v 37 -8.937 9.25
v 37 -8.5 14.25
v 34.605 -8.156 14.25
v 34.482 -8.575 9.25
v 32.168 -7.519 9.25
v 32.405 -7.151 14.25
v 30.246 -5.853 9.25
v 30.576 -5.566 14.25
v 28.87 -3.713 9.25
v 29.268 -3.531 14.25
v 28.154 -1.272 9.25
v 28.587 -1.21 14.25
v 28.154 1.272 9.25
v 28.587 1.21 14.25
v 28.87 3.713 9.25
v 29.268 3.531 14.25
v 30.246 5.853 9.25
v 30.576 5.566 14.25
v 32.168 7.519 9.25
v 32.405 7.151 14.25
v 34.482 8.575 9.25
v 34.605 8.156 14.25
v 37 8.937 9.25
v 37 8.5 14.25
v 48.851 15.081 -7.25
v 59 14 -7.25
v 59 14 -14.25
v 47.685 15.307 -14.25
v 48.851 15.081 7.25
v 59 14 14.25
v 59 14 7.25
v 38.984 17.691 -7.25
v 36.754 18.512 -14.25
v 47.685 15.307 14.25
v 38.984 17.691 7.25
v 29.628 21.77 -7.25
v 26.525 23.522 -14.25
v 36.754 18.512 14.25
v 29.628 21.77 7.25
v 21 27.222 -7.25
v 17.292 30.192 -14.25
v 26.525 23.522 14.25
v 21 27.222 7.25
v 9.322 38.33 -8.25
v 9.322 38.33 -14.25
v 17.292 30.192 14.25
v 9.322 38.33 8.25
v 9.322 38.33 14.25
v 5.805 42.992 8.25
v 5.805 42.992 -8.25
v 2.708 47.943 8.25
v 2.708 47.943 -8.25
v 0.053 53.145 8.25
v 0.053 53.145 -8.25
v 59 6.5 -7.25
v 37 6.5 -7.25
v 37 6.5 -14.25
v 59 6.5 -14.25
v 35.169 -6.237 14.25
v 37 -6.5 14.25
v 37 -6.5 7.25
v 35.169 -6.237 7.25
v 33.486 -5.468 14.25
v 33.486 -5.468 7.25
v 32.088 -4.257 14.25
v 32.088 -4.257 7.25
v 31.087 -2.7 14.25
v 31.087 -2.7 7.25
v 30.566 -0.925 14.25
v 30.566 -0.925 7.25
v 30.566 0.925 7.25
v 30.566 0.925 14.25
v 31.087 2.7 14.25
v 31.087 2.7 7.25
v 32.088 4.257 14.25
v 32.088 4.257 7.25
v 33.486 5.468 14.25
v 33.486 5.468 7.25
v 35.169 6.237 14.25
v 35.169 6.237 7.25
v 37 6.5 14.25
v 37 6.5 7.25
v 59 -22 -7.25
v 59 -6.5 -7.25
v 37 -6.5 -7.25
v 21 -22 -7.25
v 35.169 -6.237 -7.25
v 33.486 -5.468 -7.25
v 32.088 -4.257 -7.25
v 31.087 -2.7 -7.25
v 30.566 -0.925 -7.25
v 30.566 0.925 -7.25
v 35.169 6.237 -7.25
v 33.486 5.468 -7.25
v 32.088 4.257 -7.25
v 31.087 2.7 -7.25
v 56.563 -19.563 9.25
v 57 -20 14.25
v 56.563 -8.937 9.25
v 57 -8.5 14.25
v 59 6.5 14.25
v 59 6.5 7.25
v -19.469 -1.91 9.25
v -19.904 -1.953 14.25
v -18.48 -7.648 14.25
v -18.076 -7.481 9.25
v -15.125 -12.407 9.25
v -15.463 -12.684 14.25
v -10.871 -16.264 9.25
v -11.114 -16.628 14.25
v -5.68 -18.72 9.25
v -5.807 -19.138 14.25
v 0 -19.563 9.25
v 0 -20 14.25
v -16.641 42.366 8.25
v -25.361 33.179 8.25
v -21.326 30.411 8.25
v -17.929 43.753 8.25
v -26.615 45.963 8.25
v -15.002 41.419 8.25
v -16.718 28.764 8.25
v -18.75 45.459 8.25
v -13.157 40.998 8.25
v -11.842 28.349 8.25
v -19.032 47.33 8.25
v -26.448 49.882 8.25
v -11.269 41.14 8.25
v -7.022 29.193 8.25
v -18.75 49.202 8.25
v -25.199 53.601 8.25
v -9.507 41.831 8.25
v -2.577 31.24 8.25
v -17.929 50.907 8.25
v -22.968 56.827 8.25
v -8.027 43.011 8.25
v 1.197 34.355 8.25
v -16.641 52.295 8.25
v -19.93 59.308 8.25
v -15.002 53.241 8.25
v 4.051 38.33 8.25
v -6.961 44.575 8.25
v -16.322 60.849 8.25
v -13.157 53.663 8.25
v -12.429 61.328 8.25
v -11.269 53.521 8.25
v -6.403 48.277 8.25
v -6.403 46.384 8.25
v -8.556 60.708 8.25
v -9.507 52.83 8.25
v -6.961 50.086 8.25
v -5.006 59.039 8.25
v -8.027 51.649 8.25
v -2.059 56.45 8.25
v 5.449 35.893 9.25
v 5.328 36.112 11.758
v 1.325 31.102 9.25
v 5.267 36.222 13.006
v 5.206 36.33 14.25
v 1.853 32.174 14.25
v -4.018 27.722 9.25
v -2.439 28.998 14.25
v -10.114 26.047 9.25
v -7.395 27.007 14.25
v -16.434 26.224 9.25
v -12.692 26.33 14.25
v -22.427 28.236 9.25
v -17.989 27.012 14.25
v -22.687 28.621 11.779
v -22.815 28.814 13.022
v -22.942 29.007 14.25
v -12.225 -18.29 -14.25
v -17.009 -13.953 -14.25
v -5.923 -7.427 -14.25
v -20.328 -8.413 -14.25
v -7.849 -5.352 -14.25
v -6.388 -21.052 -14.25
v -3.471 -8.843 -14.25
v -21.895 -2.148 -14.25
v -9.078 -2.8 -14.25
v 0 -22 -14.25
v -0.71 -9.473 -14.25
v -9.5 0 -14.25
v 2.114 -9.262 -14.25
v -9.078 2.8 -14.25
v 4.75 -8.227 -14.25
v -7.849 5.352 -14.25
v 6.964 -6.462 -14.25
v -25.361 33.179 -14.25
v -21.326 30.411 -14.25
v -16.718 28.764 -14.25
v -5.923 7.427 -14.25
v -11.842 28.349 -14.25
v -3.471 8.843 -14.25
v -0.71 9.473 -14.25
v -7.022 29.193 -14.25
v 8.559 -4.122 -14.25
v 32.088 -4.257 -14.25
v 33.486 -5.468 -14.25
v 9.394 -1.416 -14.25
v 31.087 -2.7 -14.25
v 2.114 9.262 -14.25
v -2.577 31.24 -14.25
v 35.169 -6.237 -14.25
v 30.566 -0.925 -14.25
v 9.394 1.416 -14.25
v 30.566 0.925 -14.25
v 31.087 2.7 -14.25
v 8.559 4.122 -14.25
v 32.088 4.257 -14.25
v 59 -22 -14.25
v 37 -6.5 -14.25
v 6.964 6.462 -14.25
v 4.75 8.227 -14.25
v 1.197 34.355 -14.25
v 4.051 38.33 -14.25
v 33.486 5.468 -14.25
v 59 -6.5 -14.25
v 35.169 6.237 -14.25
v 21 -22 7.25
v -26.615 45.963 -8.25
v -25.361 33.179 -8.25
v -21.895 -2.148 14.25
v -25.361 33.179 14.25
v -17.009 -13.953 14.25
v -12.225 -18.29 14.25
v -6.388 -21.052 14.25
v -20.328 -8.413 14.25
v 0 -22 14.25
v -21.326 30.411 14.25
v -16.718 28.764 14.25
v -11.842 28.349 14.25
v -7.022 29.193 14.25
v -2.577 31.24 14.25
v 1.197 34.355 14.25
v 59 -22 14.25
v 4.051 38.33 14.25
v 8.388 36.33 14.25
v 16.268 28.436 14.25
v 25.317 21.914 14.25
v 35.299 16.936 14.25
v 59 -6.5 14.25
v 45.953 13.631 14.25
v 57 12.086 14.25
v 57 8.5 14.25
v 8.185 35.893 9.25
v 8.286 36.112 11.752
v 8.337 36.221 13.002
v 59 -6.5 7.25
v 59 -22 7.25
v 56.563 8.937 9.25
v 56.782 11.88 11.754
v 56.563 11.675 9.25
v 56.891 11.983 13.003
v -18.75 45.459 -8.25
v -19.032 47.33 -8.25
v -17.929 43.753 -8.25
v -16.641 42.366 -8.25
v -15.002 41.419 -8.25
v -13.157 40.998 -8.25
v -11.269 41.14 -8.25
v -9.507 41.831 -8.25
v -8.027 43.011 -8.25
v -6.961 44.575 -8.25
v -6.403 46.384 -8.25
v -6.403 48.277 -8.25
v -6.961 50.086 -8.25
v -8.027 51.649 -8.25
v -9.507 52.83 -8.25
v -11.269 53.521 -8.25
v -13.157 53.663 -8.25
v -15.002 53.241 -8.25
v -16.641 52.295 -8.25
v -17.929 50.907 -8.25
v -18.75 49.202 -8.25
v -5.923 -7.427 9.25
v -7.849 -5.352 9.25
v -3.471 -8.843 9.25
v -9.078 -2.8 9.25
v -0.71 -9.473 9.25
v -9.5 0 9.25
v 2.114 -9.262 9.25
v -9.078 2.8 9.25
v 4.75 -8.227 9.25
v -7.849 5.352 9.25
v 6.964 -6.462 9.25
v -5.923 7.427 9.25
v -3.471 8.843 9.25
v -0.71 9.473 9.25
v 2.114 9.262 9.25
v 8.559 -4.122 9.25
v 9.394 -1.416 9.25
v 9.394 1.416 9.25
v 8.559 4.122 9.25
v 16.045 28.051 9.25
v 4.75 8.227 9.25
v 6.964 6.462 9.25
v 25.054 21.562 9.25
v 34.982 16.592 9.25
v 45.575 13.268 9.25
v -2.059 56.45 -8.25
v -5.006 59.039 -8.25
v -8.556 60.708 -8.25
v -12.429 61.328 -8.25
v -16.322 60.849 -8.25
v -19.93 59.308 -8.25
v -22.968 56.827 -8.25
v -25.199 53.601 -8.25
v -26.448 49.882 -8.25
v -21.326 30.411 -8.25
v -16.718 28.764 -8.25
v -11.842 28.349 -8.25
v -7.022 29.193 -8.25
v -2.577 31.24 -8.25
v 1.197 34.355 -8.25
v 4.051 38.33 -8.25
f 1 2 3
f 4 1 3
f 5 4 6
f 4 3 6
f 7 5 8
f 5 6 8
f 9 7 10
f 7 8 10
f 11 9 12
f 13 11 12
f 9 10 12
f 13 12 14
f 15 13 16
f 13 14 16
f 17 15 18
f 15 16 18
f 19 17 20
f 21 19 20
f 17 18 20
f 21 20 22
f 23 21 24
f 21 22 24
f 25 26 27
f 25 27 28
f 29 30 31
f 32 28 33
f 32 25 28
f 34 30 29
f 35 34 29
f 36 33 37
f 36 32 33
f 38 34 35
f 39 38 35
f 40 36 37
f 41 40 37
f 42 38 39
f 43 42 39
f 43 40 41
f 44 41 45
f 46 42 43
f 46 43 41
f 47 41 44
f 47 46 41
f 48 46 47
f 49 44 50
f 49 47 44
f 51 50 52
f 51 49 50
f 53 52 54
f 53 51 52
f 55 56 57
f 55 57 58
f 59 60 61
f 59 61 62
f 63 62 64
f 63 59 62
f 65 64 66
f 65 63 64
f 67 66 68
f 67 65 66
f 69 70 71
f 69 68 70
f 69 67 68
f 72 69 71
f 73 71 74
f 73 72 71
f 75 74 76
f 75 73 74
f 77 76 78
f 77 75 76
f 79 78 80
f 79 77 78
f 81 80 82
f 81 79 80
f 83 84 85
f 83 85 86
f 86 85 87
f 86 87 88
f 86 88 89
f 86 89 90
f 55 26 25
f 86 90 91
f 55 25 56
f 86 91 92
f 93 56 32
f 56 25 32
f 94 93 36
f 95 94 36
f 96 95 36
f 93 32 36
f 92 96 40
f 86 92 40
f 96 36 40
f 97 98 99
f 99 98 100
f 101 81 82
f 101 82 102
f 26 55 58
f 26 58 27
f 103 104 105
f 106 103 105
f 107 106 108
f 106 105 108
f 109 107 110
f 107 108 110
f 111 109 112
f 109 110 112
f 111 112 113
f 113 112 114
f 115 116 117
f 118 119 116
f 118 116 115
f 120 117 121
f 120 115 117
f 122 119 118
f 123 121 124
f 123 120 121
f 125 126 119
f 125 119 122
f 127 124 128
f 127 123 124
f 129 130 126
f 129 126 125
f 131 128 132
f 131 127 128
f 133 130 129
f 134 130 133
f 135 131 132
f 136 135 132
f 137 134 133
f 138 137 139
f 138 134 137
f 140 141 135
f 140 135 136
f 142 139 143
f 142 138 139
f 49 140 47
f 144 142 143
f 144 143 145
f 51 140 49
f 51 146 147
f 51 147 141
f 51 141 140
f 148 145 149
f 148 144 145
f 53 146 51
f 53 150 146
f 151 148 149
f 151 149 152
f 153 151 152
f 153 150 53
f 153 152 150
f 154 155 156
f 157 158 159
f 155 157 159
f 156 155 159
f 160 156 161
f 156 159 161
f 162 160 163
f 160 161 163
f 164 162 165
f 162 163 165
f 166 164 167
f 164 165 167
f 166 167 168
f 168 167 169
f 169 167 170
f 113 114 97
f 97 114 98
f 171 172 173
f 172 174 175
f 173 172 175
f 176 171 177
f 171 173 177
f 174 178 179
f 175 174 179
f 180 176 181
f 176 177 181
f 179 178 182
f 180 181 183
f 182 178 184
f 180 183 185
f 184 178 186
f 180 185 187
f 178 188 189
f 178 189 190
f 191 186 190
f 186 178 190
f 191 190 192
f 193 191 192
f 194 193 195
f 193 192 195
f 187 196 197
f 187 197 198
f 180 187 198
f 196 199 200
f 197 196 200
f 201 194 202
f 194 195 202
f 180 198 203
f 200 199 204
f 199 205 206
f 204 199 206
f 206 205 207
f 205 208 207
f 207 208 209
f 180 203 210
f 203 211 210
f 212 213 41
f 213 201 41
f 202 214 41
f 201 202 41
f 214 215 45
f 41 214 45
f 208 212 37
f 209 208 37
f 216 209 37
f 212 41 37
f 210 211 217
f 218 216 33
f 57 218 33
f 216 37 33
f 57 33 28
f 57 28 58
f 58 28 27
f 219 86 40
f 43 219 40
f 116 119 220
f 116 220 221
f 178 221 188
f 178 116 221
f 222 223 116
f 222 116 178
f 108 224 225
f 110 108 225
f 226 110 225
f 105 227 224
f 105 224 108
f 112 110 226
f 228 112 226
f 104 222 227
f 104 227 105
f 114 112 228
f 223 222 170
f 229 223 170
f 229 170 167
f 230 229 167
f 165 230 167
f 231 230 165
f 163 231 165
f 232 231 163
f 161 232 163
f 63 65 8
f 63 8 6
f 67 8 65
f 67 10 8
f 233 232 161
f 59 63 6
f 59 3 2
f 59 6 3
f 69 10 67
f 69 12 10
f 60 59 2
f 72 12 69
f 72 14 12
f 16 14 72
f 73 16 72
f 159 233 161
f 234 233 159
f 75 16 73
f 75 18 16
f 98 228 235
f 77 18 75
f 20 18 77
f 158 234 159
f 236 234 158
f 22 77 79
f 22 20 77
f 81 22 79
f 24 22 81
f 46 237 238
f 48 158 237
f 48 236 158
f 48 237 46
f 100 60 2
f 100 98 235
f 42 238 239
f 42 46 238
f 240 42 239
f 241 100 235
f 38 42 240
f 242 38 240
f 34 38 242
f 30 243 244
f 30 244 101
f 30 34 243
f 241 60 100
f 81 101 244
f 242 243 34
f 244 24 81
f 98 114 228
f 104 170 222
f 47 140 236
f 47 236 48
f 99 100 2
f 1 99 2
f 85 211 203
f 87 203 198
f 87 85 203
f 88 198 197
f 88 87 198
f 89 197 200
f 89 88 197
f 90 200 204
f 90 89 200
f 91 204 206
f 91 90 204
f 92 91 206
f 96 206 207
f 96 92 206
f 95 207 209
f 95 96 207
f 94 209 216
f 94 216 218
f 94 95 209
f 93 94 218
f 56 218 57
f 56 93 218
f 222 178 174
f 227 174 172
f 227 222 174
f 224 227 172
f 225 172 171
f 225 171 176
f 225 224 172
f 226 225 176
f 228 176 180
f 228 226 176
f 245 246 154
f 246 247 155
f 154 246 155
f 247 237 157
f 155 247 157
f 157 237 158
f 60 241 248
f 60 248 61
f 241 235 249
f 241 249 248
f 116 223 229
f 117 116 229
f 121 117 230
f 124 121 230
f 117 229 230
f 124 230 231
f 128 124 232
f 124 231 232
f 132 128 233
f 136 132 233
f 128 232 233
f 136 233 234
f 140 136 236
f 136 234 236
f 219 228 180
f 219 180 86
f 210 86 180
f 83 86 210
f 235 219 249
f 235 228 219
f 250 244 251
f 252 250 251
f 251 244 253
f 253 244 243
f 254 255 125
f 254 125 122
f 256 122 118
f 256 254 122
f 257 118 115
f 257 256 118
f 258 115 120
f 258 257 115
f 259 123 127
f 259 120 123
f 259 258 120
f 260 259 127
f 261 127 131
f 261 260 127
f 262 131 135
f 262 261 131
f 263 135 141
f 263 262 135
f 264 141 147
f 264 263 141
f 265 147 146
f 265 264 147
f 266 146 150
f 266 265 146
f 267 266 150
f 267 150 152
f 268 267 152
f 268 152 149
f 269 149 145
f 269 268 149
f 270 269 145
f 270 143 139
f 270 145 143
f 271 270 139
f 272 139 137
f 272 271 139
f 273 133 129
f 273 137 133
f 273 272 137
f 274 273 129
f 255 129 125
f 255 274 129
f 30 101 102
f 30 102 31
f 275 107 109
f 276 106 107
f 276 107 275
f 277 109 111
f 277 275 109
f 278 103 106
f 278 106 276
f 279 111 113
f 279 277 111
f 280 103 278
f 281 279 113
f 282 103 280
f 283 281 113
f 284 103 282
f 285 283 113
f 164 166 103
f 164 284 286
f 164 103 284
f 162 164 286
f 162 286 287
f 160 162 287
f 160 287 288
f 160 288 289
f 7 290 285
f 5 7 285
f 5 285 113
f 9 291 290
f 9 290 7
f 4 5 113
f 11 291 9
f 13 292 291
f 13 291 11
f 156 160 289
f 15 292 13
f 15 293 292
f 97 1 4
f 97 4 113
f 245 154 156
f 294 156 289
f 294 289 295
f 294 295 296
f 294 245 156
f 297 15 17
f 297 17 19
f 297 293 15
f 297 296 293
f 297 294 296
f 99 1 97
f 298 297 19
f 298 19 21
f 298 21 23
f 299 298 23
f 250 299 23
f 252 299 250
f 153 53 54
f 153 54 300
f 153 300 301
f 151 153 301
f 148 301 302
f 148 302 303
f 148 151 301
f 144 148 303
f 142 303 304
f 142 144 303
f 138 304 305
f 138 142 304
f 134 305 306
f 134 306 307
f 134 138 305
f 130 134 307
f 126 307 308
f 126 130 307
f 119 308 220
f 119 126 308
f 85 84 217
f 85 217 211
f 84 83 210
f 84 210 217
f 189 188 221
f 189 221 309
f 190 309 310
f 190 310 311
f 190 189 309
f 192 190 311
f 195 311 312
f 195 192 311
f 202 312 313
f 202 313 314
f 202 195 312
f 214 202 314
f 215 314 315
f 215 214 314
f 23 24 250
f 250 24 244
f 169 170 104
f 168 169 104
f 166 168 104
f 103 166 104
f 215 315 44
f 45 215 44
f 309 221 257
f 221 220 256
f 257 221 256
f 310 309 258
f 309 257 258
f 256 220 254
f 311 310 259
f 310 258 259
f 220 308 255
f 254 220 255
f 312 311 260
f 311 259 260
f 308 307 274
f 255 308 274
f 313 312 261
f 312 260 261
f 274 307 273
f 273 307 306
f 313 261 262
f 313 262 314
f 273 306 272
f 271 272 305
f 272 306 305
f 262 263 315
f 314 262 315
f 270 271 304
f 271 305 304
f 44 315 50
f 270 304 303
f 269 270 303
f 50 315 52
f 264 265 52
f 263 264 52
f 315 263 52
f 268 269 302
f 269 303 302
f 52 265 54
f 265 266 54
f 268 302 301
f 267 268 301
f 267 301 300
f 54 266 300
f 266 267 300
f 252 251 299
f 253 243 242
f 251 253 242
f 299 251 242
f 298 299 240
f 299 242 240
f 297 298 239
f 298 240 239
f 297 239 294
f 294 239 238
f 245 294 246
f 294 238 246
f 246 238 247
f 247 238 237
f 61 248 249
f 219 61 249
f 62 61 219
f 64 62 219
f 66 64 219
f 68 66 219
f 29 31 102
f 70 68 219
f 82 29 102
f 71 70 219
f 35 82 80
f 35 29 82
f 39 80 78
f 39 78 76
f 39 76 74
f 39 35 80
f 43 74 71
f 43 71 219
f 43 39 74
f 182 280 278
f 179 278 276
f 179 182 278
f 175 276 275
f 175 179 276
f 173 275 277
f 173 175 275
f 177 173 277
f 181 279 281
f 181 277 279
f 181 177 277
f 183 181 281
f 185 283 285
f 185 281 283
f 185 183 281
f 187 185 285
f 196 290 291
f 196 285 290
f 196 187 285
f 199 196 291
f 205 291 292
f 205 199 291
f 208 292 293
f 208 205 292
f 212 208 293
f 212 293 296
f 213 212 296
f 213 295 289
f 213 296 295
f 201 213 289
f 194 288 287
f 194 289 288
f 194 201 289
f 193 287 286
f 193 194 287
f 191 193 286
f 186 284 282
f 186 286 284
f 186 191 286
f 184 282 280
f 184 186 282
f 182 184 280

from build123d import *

# Parameters (mm, degrees)
ESQUISSE1_R                  = 9.5
ESQUISSE1_R_2                = 6.35
BOSS_EXTRU_1_DEPTH           = 14.25
ENL_V_MAT_EXTRU_1_DEPTH      = 6
ENL_V_MAT_EXTRU_2_DEPTH      = 7.25
ENL_V_MAT_EXTRU_2_DEPTH_BACK = 7.25
ENL_V_MAT_EXTRU_3_DEPTH      = 5
ENL_V_MAT_EXTRU_3_DRAFT      = -5


with BuildPart() as part:
    # Esquisse1 → Boss.-Extru.1 (new, symmetric)
    with BuildSketch(Plane.XY):
        with BuildLine():
            Line((-26.61523279, 45.963348263), (-21.894870769, -2.148169925))
            ThreePointArc((-21.894870769, -2.148169925), (-14.777351956, -16.298155392), (0, -22))
            Line((0, -22), (59, -22))
            Line((59, -22), (59, -6.5))
            Line((59, -6.5), (37, -6.5))
            ThreePointArc((37, -6.5), (30.5, 0), (37, 6.5))
            Line((37, 6.5), (59, 6.5))
            Line((59, 6.5), (59, 14))
            ThreePointArc((59, 14), (23.937620364, 25.155899787), (0.053417306, 53.144636986))
            ThreePointArc((0.053417306, 53.144636986), (-16.322360933, 60.848824799), (-26.61523279, 45.963348263))
        make_face()
        with Locations(Location((0, 0, 0), (0, 0, 180))):
            Circle(ESQUISSE1_R, mode=Mode.SUBTRACT)
        with Locations(Location((-12.68213321, 47.330365488, 0), (0, 0, 180))):
            Circle(ESQUISSE1_R_2, mode=Mode.SUBTRACT)
    extrude(amount=BOSS_EXTRU_1_DEPTH, both=True)

    # Esquisse2 → Enlèv. mat.-Extru.1 (cut)
    with BuildSketch(Plane.XY.offset(14.25)):
        with BuildLine():
            Line((4.051067321, 38.330365488), (9.321809703, 38.330365488))
            ThreePointArc((9.321809703, 38.330365488), (4.202566317, 45.434036591), (0.053417306, 53.144636986))
            ThreePointArc((0.053417306, 53.144636986), (-16.322360933, 60.848824799), (-26.61523279, 45.963348263))
            Line((-26.61523279, 45.963348263), (-25.360971776, 33.179497931))
            ThreePointArc((-25.360971776, 33.179497931), (-9.404585059, 28.615193084), (4.051067321, 38.330365488))
        make_face()
    enl_v_mat_extru_1 = extrude(amount=-ENL_V_MAT_EXTRU_1_DEPTH, mode=Mode.SUBTRACT)

    # Symétrie1: Enlèv. mat.-Extru.1 across plane
    add(enl_v_mat_extru_1.mirror(Plane.XY), mode=Mode.SUBTRACT)

    # Esquisse3 → Enlèv. mat.-Extru.2 (cut, two sides: drawn at the far end of the back side and taken through both)
    with BuildSketch(Plane.XY.offset(-ENL_V_MAT_EXTRU_2_DEPTH_BACK)):
        with BuildLine():
            Line((21, -22), (21, 27.222240802))
            ThreePointArc((21, 27.222240802), (38.984037644, 17.691299917), (59, 14))
            Line((59, 14), (59, -22))
            Line((59, -22), (21, -22))
        make_face()
    extrude(amount=ENL_V_MAT_EXTRU_2_DEPTH + ENL_V_MAT_EXTRU_2_DEPTH_BACK, mode=Mode.SUBTRACT)


with BuildPart() as enl_v_mat_extru_3_tool:
    # Esquisse4 → Enlèv. mat.-Extru.3 (with draft: the straight prism first)
    with BuildSketch(Plane.XY.offset(14.25)):
        with BuildLine():
            Line((8.387524958, 36.330365488), (5.20641061, 36.330365488))
            ThreePointArc((5.20641061, 36.330365488), (-7.394798321, 27.006879326), (-22.942022259, 29.007301424))
            Line((-22.942022259, 29.007301424), (-19.904427971, -1.95288175))
            ThreePointArc((-19.904427971, -1.95288175), (-13.433956323, -14.816504902), (0, -20))
            Line((0, -20), (57, -20))
            Line((57, -20), (57, -8.5))
            Line((57, -8.5), (37, -8.5))
            ThreePointArc((37, -8.5), (28.5, 0), (37, 8.5))
            Line((37, 8.5), (57, 8.5))
            Line((57, 8.5), (57, 12.086242091))
            ThreePointArc((57, 12.086242091), (30.207518708, 19.223076596), (8.387524958, 36.330365488))
        make_face()
    extrude(amount=-ENL_V_MAT_EXTRU_3_DEPTH)
    # Enlèv. mat.-Extru.3: the draft: its side faces are tilted about the plane it starts from
    enl_v_mat_extru_3_sides = [enl_v_mat_extru_3_tool.faces().sort_by_distance(p)[0] for p in [
        (6.796967784, 36.330365488, 11.75),
        (-7.394798321, 27.006879326, 11.75),
        (-21.423225115, 13.527209837, 11.75),
        (-13.433956323, -14.816504902, 11.75),
        (28.5, -20, 11.75),
        (57, -14.25, 11.75),
        (47, -8.5, 11.75),
        (28.5, 0, 11.75),
        (47, 8.5, 11.75),
        (57, 10.293121046, 11.75),
        (30.207518708, 19.223076596, 11.75),
    ]]
    draft(enl_v_mat_extru_3_sides, Plane.XY.offset(14.25), ENL_V_MAT_EXTRU_3_DRAFT)


with BuildPart() as part_1:
    add(part.part)

    # Enlèv. mat.-Extru.3: cut by enl_v_mat_extru_3_tool
    add(enl_v_mat_extru_3_tool.part, mode=Mode.SUBTRACT)


solid = part_1.part
